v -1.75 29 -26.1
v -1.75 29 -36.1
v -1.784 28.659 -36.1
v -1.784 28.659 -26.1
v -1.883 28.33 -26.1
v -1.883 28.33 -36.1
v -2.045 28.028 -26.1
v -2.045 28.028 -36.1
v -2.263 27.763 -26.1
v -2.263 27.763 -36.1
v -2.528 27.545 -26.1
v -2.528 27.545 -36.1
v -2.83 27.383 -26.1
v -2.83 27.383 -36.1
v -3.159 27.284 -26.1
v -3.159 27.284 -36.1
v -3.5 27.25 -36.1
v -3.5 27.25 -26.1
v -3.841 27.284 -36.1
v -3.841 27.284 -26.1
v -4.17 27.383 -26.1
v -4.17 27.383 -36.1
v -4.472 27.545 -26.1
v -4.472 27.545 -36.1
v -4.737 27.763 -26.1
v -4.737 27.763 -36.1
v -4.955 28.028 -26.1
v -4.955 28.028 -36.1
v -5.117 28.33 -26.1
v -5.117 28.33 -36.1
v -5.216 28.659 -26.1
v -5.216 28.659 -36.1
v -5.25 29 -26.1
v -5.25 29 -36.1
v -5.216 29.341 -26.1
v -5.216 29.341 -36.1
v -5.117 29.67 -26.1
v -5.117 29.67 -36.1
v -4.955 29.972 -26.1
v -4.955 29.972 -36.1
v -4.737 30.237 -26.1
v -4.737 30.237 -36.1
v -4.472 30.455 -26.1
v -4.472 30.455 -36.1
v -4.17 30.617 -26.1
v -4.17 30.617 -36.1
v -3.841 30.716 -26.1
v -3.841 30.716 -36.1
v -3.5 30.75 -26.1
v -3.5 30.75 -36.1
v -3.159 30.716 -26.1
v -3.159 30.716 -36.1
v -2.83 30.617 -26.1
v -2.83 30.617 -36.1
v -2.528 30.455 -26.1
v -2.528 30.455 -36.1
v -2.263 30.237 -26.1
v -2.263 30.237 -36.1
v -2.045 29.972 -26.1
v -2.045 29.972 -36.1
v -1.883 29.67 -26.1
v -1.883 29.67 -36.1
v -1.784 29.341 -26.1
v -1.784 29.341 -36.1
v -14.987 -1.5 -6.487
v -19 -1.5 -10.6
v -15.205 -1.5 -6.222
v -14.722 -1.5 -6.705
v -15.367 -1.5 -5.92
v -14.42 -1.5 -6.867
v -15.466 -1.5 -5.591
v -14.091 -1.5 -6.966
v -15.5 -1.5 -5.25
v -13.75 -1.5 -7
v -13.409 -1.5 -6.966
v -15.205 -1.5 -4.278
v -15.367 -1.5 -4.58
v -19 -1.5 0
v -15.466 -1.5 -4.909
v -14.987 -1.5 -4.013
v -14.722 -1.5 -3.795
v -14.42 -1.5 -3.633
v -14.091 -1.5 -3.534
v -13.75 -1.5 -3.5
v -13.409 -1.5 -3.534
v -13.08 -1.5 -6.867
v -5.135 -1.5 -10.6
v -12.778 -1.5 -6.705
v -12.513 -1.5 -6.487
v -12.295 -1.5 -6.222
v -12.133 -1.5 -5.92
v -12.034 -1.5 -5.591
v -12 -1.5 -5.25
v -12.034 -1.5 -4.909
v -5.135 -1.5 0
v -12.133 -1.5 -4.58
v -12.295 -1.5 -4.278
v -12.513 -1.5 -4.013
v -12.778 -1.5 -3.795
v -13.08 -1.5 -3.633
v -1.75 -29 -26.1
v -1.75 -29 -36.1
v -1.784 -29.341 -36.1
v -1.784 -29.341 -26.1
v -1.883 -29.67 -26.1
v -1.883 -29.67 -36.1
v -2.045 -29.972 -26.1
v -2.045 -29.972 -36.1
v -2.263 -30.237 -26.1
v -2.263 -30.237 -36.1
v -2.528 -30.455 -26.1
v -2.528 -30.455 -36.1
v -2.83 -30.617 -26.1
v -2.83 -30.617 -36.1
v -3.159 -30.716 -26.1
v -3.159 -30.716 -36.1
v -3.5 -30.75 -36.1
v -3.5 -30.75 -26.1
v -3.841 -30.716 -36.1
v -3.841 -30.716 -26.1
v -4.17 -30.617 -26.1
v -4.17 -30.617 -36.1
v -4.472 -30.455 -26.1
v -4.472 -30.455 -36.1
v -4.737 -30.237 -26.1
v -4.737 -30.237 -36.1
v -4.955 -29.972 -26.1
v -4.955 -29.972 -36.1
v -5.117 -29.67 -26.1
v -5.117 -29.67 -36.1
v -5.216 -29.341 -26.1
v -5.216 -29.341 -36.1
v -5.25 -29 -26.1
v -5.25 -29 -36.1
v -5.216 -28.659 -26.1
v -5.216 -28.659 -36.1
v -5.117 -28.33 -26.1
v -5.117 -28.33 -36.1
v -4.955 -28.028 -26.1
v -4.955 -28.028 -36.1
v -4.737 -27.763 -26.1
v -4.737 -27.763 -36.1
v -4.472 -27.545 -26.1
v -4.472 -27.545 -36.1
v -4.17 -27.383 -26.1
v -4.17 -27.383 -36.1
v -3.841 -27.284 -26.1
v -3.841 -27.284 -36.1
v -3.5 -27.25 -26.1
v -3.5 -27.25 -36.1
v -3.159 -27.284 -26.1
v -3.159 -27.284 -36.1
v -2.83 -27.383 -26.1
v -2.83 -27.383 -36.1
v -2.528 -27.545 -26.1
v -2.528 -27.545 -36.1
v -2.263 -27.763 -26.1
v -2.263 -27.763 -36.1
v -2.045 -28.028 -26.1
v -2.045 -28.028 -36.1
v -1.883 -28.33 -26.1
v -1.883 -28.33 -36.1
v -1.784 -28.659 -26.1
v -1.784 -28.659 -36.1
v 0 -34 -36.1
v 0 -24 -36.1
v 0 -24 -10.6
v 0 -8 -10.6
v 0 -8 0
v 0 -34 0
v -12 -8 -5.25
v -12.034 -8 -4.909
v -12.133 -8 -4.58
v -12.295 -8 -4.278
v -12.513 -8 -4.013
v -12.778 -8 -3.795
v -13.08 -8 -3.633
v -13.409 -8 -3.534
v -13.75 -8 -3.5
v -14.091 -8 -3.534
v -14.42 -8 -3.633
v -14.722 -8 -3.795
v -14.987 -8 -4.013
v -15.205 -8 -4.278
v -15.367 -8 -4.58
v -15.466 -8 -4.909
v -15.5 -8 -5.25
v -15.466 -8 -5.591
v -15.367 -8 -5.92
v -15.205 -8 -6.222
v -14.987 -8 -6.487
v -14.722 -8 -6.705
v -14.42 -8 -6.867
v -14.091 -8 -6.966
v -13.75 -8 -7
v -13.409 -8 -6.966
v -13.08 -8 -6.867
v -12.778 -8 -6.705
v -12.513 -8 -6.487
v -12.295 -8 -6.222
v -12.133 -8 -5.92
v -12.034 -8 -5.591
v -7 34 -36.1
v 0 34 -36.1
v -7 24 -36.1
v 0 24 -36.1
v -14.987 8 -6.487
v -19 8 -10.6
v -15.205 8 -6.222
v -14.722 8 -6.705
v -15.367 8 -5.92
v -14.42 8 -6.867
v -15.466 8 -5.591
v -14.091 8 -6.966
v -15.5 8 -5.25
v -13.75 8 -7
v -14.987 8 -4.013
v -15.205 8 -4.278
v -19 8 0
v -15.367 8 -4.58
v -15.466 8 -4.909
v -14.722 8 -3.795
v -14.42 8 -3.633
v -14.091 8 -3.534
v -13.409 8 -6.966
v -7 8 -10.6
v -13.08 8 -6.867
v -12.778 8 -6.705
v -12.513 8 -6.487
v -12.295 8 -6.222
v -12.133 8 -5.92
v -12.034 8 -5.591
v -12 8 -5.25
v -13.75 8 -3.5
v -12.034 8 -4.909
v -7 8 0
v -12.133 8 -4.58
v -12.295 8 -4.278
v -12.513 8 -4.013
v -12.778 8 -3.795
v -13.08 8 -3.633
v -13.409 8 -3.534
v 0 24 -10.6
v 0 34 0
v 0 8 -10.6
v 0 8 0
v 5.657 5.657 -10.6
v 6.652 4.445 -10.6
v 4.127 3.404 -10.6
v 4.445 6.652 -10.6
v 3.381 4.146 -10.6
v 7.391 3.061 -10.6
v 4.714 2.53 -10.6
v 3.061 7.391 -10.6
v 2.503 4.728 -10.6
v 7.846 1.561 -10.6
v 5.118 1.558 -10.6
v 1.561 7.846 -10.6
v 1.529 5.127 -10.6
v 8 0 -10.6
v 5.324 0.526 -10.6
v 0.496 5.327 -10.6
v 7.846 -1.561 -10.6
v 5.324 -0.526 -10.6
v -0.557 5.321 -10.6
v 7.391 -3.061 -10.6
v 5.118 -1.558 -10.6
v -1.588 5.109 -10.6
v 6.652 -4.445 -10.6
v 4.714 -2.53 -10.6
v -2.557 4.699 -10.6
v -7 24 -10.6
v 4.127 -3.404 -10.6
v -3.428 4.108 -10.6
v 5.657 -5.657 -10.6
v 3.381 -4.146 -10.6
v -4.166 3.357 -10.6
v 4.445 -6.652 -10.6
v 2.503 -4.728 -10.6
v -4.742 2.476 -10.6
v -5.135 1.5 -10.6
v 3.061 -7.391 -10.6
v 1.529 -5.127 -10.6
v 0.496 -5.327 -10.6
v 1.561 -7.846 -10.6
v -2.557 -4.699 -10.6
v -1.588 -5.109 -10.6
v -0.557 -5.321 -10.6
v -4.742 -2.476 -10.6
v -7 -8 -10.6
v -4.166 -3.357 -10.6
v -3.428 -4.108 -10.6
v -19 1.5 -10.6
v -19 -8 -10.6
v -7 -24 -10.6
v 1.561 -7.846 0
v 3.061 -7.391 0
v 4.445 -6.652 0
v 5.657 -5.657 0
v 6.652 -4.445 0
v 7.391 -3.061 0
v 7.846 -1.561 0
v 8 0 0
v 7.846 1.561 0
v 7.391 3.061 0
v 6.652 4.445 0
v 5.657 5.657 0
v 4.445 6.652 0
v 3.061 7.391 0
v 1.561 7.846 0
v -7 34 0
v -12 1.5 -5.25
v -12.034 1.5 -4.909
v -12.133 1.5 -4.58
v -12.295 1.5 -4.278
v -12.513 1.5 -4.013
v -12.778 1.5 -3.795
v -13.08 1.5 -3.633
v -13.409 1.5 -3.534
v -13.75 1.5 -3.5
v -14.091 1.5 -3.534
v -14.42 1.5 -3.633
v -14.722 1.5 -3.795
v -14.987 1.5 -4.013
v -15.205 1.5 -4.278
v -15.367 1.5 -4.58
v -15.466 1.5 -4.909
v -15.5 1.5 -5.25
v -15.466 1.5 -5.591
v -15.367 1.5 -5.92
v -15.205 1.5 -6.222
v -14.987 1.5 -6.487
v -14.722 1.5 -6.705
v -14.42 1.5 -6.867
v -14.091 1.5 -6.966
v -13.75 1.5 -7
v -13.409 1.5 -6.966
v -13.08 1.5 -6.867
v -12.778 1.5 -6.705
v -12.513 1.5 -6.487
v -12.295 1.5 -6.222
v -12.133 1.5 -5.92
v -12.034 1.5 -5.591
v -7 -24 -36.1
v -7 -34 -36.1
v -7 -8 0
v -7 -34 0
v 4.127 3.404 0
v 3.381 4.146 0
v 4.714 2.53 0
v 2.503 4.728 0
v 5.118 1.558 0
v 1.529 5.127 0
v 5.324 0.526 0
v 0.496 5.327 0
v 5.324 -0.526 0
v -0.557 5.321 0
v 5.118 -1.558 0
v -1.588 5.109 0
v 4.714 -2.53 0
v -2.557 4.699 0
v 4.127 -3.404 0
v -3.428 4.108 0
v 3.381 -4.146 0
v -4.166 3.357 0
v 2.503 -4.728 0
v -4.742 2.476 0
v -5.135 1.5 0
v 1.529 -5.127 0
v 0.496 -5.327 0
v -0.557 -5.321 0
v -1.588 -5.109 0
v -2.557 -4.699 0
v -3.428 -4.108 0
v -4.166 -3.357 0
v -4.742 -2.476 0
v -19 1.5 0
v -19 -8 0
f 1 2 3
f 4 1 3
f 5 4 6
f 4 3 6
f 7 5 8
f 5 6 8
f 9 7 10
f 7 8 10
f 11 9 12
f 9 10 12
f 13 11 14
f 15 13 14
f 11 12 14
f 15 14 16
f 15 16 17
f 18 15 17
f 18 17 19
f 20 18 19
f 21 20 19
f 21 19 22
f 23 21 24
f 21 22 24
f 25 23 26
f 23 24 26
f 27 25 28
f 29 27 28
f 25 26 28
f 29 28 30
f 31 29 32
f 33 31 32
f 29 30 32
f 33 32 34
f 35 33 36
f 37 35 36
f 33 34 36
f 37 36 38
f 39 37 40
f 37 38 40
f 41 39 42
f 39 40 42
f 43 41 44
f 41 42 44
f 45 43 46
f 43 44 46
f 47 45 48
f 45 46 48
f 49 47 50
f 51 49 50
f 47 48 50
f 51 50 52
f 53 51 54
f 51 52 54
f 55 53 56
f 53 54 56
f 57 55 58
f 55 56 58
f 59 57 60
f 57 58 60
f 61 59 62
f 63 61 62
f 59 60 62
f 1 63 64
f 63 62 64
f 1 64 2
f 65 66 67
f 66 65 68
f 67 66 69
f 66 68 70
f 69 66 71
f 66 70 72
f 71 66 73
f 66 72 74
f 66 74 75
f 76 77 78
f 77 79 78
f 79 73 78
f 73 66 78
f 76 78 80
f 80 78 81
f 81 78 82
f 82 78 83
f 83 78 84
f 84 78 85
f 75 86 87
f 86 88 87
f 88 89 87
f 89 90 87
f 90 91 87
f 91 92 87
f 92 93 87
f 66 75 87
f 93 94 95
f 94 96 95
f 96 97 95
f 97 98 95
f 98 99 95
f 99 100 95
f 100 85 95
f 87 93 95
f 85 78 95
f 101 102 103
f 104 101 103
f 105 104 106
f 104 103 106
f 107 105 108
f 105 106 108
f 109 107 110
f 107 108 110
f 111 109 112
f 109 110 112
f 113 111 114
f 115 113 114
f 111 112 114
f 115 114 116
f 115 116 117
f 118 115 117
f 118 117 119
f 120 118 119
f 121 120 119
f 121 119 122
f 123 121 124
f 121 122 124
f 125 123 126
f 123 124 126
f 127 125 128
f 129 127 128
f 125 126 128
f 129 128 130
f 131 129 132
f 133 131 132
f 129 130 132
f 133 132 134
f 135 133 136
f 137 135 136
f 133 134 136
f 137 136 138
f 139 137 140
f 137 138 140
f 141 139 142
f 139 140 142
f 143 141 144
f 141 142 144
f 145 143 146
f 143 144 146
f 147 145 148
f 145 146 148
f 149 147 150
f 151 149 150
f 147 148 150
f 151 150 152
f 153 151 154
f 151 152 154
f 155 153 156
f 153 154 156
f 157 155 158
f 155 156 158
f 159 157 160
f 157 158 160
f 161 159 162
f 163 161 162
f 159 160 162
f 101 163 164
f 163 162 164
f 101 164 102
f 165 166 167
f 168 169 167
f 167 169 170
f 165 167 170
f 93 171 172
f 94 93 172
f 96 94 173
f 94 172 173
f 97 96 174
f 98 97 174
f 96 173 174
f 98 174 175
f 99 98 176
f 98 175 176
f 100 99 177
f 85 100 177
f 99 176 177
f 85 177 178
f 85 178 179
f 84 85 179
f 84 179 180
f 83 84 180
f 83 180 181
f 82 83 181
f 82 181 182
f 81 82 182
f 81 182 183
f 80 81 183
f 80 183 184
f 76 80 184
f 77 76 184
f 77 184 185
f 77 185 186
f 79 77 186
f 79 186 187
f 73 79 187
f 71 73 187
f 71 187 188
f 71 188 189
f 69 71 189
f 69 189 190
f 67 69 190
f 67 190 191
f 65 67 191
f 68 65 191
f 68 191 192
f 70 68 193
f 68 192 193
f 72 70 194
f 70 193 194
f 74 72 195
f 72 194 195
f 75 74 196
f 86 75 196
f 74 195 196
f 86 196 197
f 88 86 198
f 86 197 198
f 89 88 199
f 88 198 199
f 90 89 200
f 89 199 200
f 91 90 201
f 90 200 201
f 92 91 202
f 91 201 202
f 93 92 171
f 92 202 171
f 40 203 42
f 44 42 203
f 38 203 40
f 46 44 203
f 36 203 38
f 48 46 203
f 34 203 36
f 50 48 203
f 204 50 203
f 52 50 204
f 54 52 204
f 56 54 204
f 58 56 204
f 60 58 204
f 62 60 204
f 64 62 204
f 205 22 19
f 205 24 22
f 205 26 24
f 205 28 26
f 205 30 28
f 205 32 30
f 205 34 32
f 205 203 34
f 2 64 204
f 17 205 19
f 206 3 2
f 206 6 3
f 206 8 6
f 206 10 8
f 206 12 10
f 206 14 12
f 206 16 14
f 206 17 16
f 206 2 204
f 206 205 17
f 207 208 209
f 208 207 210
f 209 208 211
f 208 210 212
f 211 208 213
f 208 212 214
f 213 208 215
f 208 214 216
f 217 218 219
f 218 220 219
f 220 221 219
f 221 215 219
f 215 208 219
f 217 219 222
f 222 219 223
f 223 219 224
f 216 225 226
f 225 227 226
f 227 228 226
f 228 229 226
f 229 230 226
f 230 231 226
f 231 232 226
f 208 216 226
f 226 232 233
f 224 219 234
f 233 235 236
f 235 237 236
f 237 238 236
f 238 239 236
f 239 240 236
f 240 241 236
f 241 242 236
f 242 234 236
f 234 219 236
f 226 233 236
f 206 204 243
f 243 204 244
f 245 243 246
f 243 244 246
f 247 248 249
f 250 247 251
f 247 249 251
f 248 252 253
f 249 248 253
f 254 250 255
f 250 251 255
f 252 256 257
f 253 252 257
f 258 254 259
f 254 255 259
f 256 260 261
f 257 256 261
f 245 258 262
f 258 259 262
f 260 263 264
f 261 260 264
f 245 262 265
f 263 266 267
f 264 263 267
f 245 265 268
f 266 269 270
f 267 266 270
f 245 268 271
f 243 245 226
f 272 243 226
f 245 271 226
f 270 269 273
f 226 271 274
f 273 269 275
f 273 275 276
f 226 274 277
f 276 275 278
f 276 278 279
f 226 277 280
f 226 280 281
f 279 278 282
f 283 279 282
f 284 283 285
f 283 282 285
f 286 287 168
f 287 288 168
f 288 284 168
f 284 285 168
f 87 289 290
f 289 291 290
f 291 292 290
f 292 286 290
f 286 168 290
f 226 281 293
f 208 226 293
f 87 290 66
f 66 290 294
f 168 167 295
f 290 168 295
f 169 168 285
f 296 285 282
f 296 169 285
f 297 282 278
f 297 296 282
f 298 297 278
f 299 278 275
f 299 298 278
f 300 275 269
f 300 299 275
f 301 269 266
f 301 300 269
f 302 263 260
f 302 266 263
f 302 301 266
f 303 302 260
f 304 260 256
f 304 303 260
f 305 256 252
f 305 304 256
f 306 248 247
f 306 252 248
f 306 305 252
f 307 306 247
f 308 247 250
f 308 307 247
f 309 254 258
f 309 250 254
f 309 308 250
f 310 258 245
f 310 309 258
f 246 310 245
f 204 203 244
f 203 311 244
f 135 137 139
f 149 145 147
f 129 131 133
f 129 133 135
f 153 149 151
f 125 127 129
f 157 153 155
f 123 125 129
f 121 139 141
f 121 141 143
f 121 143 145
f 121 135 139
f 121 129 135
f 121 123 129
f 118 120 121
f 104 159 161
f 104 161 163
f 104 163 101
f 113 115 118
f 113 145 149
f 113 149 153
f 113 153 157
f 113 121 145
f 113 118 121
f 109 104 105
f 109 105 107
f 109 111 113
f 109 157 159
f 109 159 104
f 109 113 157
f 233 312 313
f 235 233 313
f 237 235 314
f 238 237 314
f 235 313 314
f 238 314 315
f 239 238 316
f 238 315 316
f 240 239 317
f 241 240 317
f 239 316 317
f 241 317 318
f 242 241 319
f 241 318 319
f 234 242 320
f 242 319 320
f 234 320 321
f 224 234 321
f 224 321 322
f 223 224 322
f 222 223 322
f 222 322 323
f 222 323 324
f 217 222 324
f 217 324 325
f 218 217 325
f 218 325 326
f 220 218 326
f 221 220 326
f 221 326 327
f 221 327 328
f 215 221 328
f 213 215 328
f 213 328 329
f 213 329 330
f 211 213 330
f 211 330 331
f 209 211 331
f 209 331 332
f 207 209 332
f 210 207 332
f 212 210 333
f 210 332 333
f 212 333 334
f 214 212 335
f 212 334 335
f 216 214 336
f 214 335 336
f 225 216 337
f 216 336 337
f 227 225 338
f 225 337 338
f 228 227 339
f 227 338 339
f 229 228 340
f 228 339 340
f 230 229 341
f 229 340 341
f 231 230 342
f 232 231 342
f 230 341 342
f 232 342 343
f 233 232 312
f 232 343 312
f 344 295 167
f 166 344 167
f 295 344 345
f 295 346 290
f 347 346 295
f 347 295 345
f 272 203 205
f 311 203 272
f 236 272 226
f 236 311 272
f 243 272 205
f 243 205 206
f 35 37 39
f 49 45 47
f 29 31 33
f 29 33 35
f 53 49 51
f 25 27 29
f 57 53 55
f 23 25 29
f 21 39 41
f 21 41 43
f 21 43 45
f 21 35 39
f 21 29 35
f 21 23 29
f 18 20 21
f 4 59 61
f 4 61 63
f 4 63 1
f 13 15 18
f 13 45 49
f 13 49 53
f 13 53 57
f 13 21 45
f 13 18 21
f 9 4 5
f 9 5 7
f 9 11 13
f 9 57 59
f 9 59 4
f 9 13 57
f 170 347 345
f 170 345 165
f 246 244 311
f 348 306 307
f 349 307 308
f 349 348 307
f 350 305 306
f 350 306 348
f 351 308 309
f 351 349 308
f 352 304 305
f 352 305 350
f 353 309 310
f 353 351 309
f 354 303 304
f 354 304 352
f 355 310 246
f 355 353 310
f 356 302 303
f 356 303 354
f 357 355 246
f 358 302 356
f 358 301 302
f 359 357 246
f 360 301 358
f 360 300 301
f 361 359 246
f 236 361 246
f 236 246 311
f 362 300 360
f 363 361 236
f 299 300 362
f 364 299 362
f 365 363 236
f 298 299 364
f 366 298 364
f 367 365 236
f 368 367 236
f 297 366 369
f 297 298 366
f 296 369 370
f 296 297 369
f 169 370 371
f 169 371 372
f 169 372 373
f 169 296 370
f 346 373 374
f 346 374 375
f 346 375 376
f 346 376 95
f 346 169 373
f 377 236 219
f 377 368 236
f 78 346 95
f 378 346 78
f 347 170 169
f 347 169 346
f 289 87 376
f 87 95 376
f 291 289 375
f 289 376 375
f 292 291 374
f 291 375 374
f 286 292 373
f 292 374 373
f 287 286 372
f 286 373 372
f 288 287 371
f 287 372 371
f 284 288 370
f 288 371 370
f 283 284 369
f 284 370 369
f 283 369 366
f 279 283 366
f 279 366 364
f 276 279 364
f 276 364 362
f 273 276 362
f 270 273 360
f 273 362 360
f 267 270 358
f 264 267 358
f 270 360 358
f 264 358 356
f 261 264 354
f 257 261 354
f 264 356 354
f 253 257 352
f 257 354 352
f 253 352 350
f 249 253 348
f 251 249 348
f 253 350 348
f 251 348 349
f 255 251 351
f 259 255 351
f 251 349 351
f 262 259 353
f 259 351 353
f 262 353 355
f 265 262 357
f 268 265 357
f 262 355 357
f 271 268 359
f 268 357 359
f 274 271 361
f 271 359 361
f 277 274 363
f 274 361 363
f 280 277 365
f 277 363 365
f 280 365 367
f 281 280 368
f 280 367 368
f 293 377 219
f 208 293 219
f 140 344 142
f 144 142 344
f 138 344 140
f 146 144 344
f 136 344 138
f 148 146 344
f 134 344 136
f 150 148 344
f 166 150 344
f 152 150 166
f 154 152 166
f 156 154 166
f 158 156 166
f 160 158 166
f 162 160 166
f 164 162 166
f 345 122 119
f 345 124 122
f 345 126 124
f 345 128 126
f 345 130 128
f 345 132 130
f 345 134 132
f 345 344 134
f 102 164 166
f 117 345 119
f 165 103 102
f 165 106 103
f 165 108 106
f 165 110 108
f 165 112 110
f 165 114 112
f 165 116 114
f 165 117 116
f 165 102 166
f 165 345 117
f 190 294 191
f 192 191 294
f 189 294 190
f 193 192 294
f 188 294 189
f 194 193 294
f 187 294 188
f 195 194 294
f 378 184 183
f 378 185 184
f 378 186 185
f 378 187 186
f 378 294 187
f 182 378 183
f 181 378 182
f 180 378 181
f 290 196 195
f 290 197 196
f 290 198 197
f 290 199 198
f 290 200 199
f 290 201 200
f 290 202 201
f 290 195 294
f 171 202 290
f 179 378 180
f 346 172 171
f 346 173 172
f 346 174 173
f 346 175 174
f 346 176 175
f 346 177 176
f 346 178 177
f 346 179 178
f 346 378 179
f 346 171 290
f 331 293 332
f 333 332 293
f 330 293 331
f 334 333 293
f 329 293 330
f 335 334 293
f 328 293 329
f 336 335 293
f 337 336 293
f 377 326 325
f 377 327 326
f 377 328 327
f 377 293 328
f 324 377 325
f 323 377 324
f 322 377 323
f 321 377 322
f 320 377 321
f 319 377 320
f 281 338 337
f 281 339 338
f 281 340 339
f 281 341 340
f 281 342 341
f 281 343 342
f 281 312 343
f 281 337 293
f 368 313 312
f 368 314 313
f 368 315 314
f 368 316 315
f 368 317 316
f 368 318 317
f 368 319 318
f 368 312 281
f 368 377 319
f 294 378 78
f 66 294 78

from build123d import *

# Parameters (mm, degrees)
F0_R      = 8
F1_DEPTH  = 10.6
F2_W      = 19
F2_H      = 6.5
F3_DEPTH  = 10.6
F4_R      = 5.35
F5_DEPTH  = 10.601
F6_W      = 5.4454011573
F6_H      = 3
F7_DEPTH  = 10.601
F8_R      = 1.75
F9_DEPTH  = 16.001
F10_W     = 7
F10_H     = 10.6
F11_DEPTH = 26
F12_W     = 7
F12_H     = 10
F13_DEPTH = 25.5
F14_W     = 7
F14_H     = 10.6
F15_DEPTH = 26
F16_W     = 7
F16_H     = 10
F17_DEPTH = 25.5
F18_R     = 1.75
F19_DEPTH = 10


with BuildPart() as f1:
    # F0 (on Top) → F1 (new body)
    with BuildSketch(Plane.XY):
        Circle(F0_R)
    extrude(amount=-F1_DEPTH)

    # F2 (on face) → F3 (join, through all)
    with BuildSketch(Plane.XY):
        with Locations((-9.5, 4.75)):
            Rectangle(F2_W, F2_H)
        with Locations((-9.5, -4.75)):
            Rectangle(F2_W, F2_H)
    extrude(amount=-F3_DEPTH)

    # F4 (on face) → F5 (cut, through all)
    with BuildSketch(Plane.XY):
        Circle(F4_R)
    extrude(amount=-F5_DEPTH, mode=Mode.SUBTRACT)

    # F6 (on face) → F7 (cut, through all)
    with BuildSketch(Plane.XY):
        with Locations((-7.8581168228, 0)):
            Rectangle(F6_W, F6_H)
    extrude(amount=-F7_DEPTH, mode=Mode.SUBTRACT)

    # F8 (on face) → F9 (cut, through all)
    with BuildSketch(Plane.XZ.offset(8)):
        with Locations((-13.75, -5.25)):
            Circle(F8_R)
    extrude(amount=-F9_DEPTH, mode=Mode.SUBTRACT)

    # F10 (on face) → F11 (join)
    with BuildSketch(Plane.XZ.offset(8)):
        with Locations((-3.5, -5.3)):
            Rectangle(F10_W, F10_H)
    extrude(amount=F11_DEPTH)

    # F12 (on face) → F13 (join)
    with BuildSketch(Plane(origin=(0, 0, -10.6), x_dir=(1, 0, 0), z_dir=(0, 0, -1))):
        with Locations((-3.5, 29)):
            Rectangle(F12_W, F12_H)
    extrude(amount=F13_DEPTH)

    # F14 (on face) → F15 (join)
    with BuildSketch(Plane(origin=(0, 8, 0), x_dir=(-1, 0, 0), z_dir=(0, 1, 0))):
        with Locations((3.5, -5.3)):
            Rectangle(F14_W, F14_H)
    extrude(amount=F15_DEPTH)

    # F16 (on face) → F17 (join)
    with BuildSketch(Plane(origin=(0, 0, -10.6), x_dir=(1, 0, 0), z_dir=(0, 0, -1))):
        with Locations((-3.5, -29)):
            Rectangle(F16_W, F16_H)
    extrude(amount=F17_DEPTH)

    # F18 (on face) → F19 (cut)
    with BuildSketch(Plane(origin=(0, 0, -36.1), x_dir=(1, 0, 0), z_dir=(0, 0, -1))):
        with Locations((-3.5, 29)):
            Circle(F18_R)
        with Locations((-3.5, -29)):
            Circle(F18_R)
    extrude(amount=-F19_DEPTH, mode=Mode.SUBTRACT)


solid = f1.part
